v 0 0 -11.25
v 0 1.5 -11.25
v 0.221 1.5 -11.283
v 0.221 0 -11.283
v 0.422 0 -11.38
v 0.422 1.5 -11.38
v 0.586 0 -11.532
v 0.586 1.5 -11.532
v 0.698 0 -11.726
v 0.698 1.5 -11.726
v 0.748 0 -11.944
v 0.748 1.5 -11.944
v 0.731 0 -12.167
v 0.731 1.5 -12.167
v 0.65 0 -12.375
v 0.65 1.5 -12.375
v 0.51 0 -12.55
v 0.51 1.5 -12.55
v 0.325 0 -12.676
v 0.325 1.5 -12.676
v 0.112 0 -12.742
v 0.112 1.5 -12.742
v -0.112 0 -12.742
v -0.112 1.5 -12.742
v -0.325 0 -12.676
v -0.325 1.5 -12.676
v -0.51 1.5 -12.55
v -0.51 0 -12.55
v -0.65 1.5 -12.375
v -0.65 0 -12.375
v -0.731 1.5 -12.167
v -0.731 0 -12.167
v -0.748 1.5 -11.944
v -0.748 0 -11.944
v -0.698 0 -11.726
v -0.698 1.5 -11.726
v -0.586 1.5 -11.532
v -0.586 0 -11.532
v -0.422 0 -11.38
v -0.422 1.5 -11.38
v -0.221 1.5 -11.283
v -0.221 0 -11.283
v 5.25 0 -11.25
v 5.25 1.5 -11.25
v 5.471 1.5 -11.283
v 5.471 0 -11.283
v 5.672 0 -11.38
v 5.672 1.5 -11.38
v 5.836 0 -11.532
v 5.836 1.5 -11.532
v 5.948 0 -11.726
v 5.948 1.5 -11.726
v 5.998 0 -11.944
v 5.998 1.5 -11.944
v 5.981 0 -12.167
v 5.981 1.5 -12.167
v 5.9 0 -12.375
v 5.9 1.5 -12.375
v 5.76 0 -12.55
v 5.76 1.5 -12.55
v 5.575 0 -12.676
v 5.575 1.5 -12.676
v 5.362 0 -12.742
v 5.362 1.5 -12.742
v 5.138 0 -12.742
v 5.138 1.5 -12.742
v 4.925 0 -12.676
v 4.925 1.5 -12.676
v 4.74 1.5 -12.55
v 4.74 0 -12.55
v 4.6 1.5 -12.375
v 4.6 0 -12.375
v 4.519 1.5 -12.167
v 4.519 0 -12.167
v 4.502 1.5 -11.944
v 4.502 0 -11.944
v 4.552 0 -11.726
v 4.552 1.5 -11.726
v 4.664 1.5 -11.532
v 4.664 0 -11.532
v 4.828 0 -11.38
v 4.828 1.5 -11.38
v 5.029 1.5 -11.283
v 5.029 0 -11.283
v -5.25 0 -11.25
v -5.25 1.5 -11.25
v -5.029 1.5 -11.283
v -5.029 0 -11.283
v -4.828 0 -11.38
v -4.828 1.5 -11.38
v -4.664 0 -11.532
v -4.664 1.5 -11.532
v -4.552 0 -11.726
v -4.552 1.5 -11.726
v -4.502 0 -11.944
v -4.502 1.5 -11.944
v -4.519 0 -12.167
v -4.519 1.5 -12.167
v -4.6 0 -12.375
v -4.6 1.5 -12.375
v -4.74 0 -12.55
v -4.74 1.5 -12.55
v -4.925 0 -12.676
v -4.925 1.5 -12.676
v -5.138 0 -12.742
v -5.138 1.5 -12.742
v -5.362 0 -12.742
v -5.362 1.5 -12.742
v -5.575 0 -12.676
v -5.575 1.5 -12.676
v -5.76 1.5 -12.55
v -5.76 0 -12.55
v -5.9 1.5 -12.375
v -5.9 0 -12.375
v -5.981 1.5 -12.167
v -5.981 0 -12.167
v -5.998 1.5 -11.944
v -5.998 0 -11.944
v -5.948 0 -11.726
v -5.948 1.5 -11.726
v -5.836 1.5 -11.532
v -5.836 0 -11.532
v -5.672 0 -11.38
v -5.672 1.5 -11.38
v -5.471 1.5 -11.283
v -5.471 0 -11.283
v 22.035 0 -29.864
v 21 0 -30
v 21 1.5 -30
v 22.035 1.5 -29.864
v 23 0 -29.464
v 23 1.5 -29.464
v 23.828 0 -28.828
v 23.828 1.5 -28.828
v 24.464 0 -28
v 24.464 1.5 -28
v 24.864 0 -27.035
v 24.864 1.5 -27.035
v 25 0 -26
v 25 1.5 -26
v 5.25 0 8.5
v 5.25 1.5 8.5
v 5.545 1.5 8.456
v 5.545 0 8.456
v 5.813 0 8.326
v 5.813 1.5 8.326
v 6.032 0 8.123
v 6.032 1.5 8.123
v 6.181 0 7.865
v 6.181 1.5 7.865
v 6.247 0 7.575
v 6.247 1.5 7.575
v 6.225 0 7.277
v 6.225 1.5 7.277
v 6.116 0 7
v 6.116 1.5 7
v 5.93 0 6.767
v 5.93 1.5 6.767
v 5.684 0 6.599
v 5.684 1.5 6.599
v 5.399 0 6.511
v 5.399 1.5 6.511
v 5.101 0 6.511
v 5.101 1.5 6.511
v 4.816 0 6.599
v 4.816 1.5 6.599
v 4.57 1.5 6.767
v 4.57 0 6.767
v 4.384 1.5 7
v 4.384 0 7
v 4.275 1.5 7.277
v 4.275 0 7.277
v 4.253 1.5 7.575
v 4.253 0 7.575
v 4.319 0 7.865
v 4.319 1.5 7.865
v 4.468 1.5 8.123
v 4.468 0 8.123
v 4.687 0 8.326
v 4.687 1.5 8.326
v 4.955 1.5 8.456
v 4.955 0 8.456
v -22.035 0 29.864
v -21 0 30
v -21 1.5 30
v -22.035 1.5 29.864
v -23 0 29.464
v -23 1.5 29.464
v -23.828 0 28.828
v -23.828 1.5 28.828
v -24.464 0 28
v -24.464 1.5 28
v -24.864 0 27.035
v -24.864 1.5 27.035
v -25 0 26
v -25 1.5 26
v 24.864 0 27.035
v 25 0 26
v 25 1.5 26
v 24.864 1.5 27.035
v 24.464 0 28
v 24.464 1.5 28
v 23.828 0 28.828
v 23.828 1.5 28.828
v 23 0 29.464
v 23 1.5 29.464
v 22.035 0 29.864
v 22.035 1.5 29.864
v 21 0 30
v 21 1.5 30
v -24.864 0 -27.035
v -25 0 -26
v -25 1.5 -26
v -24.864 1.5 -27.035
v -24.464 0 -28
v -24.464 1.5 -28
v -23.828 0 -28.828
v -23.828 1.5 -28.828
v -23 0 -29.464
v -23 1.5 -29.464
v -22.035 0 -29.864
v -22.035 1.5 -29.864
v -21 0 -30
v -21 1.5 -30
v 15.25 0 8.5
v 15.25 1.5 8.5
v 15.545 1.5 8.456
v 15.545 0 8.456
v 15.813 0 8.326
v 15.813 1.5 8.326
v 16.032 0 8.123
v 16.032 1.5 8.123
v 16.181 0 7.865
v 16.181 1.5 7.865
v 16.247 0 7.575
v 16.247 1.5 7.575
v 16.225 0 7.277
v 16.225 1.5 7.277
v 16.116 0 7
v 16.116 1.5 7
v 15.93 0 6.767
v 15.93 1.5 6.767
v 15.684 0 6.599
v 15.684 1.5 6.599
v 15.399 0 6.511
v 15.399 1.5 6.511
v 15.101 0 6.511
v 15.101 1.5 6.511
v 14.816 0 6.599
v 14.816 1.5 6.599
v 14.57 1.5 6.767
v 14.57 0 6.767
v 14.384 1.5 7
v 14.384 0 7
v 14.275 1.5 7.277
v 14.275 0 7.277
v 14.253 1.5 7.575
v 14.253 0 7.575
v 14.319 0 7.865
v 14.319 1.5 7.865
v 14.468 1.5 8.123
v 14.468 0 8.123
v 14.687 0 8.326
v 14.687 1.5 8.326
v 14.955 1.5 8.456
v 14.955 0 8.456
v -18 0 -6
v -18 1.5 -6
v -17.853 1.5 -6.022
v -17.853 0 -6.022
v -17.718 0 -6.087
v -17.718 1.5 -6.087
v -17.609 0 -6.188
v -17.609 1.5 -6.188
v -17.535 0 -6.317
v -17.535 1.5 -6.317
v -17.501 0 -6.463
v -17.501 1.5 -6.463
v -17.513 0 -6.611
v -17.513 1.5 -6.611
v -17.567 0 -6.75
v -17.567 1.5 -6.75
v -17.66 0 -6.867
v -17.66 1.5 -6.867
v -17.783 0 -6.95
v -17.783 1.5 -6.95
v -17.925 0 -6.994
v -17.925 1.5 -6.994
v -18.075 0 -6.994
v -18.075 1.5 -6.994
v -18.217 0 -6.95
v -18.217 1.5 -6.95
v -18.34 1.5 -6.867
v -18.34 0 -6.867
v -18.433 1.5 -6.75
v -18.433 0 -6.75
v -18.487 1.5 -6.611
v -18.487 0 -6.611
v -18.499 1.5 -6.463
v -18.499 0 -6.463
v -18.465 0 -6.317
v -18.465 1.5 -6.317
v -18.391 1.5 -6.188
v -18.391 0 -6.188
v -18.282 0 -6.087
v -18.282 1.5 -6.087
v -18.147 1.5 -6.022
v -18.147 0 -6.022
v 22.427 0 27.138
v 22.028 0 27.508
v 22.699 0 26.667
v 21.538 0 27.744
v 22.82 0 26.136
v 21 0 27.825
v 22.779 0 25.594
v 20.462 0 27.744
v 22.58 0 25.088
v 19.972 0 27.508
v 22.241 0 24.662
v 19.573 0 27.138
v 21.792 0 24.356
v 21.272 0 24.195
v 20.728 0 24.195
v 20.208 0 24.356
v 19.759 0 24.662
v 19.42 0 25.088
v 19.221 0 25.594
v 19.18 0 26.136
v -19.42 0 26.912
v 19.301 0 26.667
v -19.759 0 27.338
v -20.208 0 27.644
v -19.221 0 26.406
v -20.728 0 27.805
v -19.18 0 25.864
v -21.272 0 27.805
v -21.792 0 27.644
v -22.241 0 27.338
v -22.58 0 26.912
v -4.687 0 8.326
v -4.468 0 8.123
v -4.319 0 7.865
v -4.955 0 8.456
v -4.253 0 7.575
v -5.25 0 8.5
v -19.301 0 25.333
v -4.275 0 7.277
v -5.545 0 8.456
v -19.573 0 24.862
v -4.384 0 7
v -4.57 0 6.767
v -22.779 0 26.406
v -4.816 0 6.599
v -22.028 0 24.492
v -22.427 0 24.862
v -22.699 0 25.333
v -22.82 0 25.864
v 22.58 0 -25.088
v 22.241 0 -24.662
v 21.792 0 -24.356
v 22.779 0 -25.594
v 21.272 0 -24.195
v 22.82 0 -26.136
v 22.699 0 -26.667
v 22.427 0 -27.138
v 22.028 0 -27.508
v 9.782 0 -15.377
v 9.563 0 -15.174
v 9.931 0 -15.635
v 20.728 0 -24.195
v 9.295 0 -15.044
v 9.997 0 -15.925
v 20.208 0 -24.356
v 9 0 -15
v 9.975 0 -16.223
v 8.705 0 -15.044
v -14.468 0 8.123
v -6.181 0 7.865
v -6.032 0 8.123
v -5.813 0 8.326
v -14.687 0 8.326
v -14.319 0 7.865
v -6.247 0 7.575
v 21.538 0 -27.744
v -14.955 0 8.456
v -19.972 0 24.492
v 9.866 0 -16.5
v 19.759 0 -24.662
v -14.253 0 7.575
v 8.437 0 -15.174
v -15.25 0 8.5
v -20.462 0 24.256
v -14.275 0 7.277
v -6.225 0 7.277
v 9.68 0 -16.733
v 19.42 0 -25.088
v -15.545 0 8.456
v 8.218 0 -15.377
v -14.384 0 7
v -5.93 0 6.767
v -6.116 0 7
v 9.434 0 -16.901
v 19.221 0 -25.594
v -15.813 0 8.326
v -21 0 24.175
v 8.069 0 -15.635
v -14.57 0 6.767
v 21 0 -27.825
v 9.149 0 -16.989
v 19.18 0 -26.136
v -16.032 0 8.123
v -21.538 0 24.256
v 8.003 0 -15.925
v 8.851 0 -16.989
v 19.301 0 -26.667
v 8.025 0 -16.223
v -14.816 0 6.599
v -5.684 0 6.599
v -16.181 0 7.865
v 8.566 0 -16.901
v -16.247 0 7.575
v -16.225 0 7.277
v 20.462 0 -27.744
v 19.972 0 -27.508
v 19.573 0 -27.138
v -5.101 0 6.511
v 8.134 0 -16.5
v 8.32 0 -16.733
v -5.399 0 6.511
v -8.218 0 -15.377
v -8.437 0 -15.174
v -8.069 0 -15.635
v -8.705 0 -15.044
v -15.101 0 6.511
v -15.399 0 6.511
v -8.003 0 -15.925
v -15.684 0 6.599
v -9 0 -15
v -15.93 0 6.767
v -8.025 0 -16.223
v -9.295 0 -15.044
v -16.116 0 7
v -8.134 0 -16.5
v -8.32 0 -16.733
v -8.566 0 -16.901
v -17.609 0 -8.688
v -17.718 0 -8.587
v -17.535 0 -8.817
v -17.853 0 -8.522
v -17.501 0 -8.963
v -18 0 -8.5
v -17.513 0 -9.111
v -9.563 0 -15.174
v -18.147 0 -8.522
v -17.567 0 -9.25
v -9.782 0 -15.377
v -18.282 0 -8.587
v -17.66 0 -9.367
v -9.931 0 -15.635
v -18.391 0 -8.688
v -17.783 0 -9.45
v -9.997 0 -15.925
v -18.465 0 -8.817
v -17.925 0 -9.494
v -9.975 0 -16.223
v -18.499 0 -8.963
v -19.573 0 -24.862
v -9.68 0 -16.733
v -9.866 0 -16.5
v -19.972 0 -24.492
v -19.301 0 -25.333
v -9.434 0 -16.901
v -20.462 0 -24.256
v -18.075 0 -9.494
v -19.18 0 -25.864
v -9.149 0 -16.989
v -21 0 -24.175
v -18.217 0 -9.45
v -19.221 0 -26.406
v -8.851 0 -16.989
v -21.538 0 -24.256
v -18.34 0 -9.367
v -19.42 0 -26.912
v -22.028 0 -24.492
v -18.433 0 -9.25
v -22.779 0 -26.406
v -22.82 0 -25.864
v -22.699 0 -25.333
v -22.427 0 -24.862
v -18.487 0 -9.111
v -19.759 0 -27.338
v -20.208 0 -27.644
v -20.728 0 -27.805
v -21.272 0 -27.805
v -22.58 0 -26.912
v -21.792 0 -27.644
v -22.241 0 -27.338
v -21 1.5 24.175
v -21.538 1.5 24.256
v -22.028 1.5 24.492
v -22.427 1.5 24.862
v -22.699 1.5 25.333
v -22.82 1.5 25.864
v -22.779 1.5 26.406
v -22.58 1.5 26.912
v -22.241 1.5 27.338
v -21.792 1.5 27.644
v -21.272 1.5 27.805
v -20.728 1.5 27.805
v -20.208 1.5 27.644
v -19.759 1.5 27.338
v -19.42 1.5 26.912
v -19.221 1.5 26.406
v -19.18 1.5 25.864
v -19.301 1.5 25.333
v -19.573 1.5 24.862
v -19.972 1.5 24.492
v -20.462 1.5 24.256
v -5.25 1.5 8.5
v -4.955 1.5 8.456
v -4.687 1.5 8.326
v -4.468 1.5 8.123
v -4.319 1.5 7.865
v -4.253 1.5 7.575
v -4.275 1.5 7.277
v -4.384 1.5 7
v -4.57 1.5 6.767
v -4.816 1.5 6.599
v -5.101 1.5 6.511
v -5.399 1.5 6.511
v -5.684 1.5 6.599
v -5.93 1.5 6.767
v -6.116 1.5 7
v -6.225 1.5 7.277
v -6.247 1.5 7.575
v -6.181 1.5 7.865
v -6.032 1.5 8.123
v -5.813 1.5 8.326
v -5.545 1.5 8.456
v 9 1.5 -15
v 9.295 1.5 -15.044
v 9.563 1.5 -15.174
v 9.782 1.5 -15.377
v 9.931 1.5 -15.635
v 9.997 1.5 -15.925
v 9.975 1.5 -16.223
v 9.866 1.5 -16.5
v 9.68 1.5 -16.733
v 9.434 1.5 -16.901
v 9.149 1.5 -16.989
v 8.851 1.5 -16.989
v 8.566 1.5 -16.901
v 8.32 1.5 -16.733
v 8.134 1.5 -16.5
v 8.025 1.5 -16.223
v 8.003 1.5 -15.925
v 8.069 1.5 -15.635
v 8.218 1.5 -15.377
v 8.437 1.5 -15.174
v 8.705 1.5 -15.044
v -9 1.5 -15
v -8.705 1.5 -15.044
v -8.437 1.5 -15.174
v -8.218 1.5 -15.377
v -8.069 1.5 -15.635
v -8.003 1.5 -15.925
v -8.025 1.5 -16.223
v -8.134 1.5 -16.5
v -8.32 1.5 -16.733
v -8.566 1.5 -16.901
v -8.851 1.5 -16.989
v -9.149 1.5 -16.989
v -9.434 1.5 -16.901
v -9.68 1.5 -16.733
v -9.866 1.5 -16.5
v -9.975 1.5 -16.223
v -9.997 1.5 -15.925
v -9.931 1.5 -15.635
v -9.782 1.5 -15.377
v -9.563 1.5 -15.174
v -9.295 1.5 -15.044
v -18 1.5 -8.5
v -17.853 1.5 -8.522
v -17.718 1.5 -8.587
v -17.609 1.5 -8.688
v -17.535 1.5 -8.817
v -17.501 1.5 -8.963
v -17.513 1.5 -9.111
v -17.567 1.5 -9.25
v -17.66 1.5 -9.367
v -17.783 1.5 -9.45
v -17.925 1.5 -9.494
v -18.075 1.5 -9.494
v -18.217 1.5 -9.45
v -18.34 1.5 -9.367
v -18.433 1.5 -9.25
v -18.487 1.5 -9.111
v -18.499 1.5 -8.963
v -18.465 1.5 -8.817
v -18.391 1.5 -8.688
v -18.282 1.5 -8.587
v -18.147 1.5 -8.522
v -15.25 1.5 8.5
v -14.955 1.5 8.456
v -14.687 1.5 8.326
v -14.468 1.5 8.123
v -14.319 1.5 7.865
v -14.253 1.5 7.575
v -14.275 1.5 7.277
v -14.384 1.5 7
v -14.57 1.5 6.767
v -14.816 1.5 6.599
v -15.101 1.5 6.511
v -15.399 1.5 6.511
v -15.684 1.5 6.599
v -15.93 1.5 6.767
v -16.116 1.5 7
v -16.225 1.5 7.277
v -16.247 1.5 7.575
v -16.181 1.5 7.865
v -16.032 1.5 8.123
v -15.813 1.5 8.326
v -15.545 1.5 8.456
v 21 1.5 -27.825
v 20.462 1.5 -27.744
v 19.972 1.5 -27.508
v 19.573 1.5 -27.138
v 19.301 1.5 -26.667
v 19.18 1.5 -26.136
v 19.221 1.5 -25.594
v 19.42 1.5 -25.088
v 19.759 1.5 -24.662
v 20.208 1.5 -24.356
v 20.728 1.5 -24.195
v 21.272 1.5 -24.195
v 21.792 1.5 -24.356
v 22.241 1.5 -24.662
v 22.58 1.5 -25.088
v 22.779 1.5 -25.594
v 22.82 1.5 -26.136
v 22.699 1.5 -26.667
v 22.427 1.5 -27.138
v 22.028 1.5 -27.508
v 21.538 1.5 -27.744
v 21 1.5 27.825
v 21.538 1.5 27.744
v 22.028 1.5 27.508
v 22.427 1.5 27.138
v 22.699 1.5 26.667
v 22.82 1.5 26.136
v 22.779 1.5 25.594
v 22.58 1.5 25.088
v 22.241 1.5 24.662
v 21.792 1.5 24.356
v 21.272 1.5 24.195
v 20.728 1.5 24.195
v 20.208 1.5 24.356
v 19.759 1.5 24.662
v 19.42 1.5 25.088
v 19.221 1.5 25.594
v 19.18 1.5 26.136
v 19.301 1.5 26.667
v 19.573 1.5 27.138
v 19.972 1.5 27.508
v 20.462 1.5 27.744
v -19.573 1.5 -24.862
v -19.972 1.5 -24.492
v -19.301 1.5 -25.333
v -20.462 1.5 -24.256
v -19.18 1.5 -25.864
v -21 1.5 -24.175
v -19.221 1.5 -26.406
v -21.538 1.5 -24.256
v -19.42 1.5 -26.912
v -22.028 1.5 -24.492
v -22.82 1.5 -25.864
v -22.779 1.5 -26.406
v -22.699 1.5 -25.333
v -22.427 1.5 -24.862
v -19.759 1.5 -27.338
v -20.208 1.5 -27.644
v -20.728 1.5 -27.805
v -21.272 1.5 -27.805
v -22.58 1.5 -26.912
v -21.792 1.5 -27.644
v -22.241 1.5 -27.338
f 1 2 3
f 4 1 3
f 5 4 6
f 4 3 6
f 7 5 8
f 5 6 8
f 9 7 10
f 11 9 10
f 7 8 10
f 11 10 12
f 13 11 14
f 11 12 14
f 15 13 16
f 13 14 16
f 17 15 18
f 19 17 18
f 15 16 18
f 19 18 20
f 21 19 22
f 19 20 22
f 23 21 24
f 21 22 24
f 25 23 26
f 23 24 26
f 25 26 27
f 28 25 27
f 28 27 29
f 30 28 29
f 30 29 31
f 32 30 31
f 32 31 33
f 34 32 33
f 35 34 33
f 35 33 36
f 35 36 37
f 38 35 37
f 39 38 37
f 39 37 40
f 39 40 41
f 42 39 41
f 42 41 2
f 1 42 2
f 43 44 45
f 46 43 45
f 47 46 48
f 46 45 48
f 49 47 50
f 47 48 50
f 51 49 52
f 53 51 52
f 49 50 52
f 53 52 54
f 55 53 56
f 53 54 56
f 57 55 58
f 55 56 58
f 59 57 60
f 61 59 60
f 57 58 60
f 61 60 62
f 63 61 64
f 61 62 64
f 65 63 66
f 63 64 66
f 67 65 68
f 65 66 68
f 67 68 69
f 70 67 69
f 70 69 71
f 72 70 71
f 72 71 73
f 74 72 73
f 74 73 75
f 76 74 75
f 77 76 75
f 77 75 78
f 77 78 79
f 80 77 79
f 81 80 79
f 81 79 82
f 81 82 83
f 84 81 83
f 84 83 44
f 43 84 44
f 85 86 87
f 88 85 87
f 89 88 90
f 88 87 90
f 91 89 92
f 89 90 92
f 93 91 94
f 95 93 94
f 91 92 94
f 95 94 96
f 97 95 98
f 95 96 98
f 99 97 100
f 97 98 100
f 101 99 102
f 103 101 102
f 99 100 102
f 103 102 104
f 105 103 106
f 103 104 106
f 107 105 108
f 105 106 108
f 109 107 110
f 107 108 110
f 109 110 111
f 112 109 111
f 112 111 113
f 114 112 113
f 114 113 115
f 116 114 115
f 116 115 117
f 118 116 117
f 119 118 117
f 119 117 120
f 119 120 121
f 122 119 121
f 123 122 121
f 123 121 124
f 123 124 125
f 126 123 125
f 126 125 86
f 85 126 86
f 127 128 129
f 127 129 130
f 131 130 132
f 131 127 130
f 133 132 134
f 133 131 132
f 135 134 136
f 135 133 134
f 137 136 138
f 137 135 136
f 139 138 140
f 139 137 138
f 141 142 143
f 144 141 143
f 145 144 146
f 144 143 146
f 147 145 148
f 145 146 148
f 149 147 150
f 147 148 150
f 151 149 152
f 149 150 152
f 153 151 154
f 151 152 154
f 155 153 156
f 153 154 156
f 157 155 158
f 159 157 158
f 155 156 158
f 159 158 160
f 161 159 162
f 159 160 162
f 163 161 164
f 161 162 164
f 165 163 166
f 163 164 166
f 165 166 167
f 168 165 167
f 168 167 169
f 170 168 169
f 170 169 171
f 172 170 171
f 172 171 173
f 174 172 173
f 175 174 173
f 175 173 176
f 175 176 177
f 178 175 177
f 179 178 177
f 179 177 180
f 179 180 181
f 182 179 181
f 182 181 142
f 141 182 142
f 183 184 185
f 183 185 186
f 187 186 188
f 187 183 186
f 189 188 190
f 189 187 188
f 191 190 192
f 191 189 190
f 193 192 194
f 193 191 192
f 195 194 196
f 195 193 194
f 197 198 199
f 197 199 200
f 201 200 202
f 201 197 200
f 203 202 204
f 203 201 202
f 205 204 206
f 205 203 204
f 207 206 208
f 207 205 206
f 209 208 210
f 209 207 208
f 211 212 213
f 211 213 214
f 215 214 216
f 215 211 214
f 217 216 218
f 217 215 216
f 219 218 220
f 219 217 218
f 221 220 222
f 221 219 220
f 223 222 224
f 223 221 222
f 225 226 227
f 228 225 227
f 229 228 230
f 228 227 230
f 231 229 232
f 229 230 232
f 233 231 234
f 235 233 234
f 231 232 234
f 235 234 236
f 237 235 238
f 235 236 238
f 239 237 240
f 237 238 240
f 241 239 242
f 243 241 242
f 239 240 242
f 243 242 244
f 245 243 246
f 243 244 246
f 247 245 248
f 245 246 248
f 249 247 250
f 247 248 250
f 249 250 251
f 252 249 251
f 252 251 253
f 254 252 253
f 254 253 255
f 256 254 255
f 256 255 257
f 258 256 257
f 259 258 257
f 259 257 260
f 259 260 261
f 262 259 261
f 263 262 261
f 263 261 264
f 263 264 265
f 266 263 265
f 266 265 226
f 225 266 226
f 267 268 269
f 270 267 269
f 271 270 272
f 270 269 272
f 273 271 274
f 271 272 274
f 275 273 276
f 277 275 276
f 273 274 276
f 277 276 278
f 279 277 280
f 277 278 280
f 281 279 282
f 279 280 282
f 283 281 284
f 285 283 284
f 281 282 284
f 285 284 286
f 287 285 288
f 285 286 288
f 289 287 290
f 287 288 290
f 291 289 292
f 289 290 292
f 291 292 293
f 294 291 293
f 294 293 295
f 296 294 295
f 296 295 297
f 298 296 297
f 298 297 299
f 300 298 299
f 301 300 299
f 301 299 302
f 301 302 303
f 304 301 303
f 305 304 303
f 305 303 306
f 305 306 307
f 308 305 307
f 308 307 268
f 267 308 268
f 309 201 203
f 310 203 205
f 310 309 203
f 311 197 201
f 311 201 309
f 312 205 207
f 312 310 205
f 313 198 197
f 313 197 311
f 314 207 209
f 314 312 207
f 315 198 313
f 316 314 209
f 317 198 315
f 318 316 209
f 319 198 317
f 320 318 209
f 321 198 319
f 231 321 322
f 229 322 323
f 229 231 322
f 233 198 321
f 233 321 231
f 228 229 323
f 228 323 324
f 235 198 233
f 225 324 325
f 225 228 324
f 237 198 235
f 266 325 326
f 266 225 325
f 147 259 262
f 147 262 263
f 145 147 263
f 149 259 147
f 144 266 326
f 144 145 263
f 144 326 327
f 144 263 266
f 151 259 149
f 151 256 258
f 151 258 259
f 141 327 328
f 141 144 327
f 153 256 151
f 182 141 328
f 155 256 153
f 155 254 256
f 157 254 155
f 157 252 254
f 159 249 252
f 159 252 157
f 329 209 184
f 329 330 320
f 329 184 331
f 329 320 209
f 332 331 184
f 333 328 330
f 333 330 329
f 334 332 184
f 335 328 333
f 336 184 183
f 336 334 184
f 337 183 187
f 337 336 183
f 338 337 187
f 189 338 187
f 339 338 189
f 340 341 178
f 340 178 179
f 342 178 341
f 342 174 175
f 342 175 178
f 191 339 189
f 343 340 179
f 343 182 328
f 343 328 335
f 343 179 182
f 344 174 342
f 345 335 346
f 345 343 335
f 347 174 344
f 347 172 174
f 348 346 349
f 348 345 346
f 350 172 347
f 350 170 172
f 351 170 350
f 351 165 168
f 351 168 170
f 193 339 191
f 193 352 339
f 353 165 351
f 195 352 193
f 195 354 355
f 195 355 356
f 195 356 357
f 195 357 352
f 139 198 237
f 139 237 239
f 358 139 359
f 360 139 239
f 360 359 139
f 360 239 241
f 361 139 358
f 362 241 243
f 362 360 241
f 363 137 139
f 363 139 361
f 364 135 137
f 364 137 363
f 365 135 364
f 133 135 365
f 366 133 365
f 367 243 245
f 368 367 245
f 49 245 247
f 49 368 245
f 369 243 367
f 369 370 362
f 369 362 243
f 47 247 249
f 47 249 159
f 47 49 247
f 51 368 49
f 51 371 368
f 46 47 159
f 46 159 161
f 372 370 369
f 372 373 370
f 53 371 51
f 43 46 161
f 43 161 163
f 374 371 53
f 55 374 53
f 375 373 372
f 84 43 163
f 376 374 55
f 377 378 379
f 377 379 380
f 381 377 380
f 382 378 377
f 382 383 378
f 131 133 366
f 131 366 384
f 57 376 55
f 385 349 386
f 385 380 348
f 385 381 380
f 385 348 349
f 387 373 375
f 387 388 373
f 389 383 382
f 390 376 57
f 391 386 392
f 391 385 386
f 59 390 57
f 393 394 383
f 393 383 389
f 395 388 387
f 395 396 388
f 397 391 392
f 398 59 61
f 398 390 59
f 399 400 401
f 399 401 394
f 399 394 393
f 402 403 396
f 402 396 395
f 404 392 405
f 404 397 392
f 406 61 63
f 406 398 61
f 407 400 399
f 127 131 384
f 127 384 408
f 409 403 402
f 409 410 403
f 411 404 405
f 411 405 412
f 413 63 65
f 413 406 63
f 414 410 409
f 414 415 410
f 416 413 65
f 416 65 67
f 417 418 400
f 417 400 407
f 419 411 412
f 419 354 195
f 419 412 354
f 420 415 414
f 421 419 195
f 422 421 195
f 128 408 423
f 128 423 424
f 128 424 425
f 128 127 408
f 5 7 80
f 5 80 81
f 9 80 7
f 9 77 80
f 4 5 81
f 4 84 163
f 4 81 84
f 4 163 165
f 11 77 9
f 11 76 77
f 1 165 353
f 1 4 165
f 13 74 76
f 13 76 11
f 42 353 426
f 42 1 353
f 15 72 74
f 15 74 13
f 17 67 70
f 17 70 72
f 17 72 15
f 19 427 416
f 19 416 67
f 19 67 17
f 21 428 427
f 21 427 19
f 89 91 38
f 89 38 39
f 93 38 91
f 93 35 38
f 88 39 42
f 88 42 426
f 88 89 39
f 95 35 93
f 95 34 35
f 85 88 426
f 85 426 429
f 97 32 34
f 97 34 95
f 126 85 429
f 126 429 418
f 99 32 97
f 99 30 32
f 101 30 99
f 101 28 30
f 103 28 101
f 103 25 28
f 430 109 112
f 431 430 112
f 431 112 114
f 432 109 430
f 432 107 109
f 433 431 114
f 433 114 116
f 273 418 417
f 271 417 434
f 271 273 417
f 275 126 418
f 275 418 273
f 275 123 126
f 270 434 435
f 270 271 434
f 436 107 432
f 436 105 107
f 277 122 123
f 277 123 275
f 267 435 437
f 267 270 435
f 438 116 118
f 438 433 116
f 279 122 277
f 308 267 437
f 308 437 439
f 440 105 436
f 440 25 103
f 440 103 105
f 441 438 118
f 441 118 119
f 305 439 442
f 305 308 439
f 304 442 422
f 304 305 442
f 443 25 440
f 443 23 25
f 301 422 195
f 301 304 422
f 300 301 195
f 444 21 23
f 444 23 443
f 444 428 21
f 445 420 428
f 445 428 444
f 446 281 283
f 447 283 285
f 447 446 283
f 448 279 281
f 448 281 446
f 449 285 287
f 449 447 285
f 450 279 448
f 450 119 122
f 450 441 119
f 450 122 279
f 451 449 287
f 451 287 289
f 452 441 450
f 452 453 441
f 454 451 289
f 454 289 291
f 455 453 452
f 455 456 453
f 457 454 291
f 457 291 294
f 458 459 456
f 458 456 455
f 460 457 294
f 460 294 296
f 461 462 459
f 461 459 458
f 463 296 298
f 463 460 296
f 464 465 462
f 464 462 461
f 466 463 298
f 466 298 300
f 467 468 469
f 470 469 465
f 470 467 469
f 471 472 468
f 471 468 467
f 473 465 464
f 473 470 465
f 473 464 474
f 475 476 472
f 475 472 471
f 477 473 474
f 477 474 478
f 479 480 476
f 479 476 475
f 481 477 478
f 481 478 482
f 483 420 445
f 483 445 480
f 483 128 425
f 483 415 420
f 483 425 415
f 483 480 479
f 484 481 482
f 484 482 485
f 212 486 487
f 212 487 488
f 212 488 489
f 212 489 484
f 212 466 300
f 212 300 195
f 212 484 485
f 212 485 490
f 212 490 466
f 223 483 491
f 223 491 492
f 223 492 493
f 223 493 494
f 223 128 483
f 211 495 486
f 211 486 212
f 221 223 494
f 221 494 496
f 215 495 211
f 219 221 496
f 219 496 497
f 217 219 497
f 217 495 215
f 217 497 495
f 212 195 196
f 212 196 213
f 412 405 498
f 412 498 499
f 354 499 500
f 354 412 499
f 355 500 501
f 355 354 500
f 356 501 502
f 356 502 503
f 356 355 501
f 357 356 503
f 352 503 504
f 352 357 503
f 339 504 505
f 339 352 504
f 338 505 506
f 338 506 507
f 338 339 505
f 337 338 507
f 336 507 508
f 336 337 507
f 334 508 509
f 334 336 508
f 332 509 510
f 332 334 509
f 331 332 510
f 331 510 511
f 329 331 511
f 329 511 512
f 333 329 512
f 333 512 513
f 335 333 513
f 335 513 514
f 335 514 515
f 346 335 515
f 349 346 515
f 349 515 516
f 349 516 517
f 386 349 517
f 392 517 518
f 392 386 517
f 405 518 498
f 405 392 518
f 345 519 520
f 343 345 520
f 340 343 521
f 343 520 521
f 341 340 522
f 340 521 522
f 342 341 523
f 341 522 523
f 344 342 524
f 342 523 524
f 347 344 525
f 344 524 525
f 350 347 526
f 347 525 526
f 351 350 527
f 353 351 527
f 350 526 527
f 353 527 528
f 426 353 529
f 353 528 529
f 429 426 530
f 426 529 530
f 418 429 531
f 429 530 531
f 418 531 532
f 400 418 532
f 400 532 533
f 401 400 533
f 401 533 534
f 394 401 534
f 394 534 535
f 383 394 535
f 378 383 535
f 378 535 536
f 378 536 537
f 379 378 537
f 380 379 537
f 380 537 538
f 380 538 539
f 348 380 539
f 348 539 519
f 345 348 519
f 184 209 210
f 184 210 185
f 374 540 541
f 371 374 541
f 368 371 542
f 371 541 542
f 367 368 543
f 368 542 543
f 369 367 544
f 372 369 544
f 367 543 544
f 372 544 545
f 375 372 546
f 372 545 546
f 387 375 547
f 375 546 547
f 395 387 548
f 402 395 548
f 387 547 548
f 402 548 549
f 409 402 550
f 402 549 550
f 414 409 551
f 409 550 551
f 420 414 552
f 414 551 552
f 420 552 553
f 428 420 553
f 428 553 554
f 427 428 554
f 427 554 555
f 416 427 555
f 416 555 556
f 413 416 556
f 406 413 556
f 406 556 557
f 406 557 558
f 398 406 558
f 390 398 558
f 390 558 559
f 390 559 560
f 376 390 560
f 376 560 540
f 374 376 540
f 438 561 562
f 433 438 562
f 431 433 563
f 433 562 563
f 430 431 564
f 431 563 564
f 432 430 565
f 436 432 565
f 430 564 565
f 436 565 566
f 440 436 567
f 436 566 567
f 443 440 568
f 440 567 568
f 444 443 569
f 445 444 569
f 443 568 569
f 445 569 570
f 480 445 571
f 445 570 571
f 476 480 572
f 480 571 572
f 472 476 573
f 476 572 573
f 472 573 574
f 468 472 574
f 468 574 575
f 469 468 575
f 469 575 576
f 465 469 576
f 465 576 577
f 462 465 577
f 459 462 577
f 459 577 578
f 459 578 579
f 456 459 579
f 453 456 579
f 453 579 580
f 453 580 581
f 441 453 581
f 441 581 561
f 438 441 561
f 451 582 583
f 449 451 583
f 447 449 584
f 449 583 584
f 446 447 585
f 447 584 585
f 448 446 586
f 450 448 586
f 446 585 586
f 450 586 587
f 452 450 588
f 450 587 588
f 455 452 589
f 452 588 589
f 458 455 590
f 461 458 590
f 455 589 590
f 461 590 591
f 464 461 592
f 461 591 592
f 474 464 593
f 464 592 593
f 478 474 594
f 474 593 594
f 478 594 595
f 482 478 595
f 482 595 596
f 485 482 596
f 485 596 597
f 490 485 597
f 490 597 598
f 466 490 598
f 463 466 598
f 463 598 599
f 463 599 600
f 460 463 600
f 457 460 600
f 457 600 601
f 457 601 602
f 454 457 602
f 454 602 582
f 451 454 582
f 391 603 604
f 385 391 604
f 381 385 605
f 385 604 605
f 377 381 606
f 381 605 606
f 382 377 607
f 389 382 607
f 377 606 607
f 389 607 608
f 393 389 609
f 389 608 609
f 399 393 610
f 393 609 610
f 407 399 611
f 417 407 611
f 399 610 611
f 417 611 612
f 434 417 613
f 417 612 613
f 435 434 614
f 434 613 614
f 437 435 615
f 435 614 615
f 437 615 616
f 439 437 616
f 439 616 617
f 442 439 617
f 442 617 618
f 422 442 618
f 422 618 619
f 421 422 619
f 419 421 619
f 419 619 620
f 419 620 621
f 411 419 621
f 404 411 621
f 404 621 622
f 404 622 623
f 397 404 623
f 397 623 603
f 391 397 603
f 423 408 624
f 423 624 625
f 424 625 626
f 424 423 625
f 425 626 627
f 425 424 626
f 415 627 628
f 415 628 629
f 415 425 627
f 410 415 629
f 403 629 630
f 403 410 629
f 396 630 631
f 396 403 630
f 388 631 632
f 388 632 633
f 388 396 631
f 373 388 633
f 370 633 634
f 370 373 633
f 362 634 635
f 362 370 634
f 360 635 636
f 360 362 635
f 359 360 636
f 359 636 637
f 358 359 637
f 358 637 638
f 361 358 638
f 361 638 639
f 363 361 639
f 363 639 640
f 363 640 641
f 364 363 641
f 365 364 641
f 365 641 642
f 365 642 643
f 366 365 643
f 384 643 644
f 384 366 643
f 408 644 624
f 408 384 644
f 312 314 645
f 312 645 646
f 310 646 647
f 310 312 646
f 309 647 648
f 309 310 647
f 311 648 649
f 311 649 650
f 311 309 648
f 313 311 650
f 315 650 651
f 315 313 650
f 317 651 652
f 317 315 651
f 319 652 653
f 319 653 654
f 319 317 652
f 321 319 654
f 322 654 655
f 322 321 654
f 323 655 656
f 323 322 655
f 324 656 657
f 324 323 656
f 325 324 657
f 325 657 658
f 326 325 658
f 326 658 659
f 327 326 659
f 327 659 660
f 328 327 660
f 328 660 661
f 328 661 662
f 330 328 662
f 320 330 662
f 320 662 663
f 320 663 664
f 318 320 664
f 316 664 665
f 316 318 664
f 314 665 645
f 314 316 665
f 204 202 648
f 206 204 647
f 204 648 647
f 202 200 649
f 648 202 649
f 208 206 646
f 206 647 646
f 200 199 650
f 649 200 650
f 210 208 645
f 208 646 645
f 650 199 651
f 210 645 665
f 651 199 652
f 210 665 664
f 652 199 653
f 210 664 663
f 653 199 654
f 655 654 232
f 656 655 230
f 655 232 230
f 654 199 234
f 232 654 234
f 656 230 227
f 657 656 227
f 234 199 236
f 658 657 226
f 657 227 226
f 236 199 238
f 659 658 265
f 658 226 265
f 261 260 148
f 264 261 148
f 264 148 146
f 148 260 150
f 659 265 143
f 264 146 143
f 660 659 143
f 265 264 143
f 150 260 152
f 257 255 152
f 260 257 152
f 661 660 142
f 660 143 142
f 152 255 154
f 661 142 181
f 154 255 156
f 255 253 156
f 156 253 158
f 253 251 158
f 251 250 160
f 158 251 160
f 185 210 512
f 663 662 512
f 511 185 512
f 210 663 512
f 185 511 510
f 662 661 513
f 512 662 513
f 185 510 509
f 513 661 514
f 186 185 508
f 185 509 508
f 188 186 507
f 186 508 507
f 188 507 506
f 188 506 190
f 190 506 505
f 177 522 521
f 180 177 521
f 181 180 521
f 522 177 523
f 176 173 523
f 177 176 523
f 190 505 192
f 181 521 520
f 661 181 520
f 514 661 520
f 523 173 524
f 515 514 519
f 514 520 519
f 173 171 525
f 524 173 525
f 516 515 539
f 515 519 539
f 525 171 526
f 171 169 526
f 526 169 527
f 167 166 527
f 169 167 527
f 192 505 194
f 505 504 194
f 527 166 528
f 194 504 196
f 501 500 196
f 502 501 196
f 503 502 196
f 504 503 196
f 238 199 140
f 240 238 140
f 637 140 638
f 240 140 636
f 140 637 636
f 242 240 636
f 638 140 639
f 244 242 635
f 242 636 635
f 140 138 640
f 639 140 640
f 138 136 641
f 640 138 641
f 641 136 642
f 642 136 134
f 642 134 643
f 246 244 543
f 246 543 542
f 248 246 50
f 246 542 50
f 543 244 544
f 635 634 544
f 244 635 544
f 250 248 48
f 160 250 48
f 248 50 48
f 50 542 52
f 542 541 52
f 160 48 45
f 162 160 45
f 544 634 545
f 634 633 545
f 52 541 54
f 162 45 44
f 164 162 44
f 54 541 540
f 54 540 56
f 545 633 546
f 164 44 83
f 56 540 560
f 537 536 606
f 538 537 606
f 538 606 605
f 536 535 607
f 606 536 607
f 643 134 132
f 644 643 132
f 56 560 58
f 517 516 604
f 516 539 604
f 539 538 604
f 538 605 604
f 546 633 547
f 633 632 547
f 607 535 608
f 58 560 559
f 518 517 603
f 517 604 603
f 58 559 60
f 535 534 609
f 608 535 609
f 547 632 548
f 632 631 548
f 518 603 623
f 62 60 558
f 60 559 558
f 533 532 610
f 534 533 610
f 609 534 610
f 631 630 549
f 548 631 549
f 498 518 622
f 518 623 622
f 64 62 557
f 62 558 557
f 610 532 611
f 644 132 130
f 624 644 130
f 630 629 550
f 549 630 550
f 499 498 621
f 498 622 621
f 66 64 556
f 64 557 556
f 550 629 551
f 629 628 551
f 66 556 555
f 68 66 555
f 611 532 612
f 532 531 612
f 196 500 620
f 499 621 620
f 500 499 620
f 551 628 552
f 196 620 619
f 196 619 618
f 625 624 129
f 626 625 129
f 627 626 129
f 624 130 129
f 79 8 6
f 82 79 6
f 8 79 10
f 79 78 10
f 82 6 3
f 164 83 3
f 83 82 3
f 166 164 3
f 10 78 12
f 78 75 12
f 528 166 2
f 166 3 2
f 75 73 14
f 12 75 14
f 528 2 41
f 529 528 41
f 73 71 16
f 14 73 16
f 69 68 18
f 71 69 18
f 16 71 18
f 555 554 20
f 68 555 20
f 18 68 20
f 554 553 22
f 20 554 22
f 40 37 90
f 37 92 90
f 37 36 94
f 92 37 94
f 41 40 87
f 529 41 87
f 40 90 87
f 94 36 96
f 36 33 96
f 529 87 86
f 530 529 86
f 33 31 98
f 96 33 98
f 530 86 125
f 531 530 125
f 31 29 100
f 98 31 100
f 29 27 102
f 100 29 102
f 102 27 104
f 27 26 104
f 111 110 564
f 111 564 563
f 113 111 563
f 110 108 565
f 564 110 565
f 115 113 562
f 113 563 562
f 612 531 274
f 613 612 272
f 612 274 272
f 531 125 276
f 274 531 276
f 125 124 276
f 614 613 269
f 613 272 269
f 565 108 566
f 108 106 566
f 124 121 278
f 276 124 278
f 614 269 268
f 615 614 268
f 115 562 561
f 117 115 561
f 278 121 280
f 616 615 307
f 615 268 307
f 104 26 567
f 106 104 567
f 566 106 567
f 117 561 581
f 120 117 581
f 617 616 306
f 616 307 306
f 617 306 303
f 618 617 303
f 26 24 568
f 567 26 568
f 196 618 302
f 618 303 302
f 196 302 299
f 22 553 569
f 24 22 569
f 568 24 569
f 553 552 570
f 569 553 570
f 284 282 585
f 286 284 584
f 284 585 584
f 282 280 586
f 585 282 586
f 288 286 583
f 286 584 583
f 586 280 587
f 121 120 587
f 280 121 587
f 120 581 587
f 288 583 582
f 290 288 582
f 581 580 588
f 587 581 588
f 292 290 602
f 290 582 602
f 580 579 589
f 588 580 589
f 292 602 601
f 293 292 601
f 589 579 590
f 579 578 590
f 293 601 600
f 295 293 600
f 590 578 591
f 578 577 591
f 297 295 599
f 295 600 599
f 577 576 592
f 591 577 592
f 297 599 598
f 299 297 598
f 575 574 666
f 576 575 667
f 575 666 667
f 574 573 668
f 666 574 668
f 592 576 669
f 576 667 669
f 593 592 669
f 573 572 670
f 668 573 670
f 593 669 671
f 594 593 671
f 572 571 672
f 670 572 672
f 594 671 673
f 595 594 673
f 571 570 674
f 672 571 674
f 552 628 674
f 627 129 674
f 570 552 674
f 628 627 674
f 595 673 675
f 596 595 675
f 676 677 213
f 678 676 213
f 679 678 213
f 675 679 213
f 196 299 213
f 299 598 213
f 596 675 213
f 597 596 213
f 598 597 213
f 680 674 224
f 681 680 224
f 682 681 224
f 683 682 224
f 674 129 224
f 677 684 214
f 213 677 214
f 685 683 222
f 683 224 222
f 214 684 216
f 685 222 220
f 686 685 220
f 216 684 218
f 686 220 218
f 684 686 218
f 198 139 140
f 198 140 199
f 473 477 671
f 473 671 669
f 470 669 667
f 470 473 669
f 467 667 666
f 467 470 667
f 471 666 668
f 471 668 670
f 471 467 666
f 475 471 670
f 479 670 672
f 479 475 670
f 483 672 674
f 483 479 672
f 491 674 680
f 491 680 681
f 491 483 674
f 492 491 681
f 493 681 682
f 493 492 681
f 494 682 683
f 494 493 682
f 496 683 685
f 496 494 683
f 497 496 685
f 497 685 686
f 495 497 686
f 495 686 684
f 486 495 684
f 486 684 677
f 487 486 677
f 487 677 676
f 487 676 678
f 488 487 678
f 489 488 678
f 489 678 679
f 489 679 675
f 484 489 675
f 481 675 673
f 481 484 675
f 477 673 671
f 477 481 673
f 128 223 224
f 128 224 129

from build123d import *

# Parameters (mm, degrees)
SKETCH1_R           = 1.825
BOSS_EXTRUDE1_DEPTH = 1.5
CUT_EXTRUDE1_REACH  = 41.08
SKETCH2_R           = 1
SKETCH2_R_2         = 0.75
SKETCH2_R_3         = 0.5


with BuildPart() as part:
    # Sketch1 → Boss-Extrude1 (new body)
    with BuildSketch(Plane(origin=(0, 0, 0), x_dir=(1, 0, 0), z_dir=(0, 1, 0))):
        with BuildLine():
            Line((-21, 30), (21, 30))
            ThreePointArc((21, 30), (23.828427125, 28.828427125), (25, 26))
            Line((25, 26), (25, -26))
            ThreePointArc((25, -26), (23.828427125, -28.828427125), (21, -30))
            Line((21, -30), (-21, -30))
            ThreePointArc((-21, -30), (-23.828427125, -28.828427125), (-25, -26))
            Line((-25, -26), (-25, 26))
            ThreePointArc((-25, 26), (-23.828427125, 28.828427125), (-21, 30))
        make_face()
        with Locations(Location((-21, 26, 0), (0, 0, 270))):
            Circle(SKETCH1_R, mode=Mode.SUBTRACT)
        with Locations(Location((21, 26, 0), (0, 0, 90))):
            Circle(SKETCH1_R, mode=Mode.SUBTRACT)
        with Locations(Location((21, -26, 0), (0, 0, 270))):
            Circle(SKETCH1_R, mode=Mode.SUBTRACT)
        with Locations(Location((-21, -26, 0), (0, 0, 90))):
            Circle(SKETCH1_R, mode=Mode.SUBTRACT)
    extrude(amount=BOSS_EXTRUDE1_DEPTH)

    # Sketch2 → Cut-Extrude1 (cut, up to next)
    with BuildSketch(Plane(origin=(0, 1.5, 0), x_dir=(1, 0, 0), z_dir=(0, 1, 0)), mode=Mode.PRIVATE) as cut_extrude1_sk1:
        with Locations(Location((-9, 16, 0), (0, 0, 270))):
            Circle(SKETCH2_R)
    cut_extrude1_tool1 = extrude(cut_extrude1_sk1.sketch, amount=-CUT_EXTRUDE1_REACH, mode=Mode.PRIVATE) & part.part
    # Sketch2 → Cut-Extrude1 (cut, up to next)
    with BuildSketch(Plane(origin=(0, 1.5, 0), x_dir=(1, 0, 0), z_dir=(0, 1, 0)), mode=Mode.PRIVATE) as cut_extrude1_sk2:
        with Locations(Location((9, 16, 0), (0, 0, 270))):
            Circle(SKETCH2_R)
    cut_extrude1_tool2 = extrude(cut_extrude1_sk2.sketch, amount=-CUT_EXTRUDE1_REACH, mode=Mode.PRIVATE) & part.part
    # Sketch2 → Cut-Extrude1 (cut, up to next)
    with BuildSketch(Plane(origin=(0, 1.5, 0), x_dir=(1, 0, 0), z_dir=(0, 1, 0)), mode=Mode.PRIVATE) as cut_extrude1_sk3:
        with Locations(Location((-5.25, 12, 0), (0, 0, 270))):
            Circle(SKETCH2_R_2)
    cut_extrude1_tool3 = extrude(cut_extrude1_sk3.sketch, amount=-CUT_EXTRUDE1_REACH, mode=Mode.PRIVATE) & part.part
    # Sketch2 → Cut-Extrude1 (cut, up to next)
    with BuildSketch(Plane(origin=(0, 1.5, 0), x_dir=(1, 0, 0), z_dir=(0, 1, 0)), mode=Mode.PRIVATE) as cut_extrude1_sk4:
        with Locations(Location((0, 12, 0), (0, 0, 270))):
            Circle(SKETCH2_R_2)
    cut_extrude1_tool4 = extrude(cut_extrude1_sk4.sketch, amount=-CUT_EXTRUDE1_REACH, mode=Mode.PRIVATE) & part.part
    # Sketch2 → Cut-Extrude1 (cut, up to next)
    with BuildSketch(Plane(origin=(0, 1.5, 0), x_dir=(1, 0, 0), z_dir=(0, 1, 0)), mode=Mode.PRIVATE) as cut_extrude1_sk5:
        with Locations(Location((5.25, 12, 0), (0, 0, 270))):
            Circle(SKETCH2_R_2)
    cut_extrude1_tool5 = extrude(cut_extrude1_sk5.sketch, amount=-CUT_EXTRUDE1_REACH, mode=Mode.PRIVATE) & part.part
    # Sketch2 → Cut-Extrude1 (cut, up to next)
    with BuildSketch(Plane(origin=(0, 1.5, 0), x_dir=(1, 0, 0), z_dir=(0, 1, 0)), mode=Mode.PRIVATE) as cut_extrude1_sk6:
        with Locations(Location((-15.25, -7.5, 0), (0, 0, 270))):
            Circle(SKETCH2_R)
    cut_extrude1_tool6 = extrude(cut_extrude1_sk6.sketch, amount=-CUT_EXTRUDE1_REACH, mode=Mode.PRIVATE) & part.part
    # Sketch2 → Cut-Extrude1 (cut, up to next)
    with BuildSketch(Plane(origin=(0, 1.5, 0), x_dir=(1, 0, 0), z_dir=(0, 1, 0)), mode=Mode.PRIVATE) as cut_extrude1_sk7:
        with Locations(Location((-5.25, -7.5, 0), (0, 0, 270))):
            Circle(SKETCH2_R)
    cut_extrude1_tool7 = extrude(cut_extrude1_sk7.sketch, amount=-CUT_EXTRUDE1_REACH, mode=Mode.PRIVATE) & part.part
    # Sketch2 → Cut-Extrude1 (cut, up to next)
    with BuildSketch(Plane(origin=(0, 1.5, 0), x_dir=(1, 0, 0), z_dir=(0, 1, 0)), mode=Mode.PRIVATE) as cut_extrude1_sk8:
        with Locations(Location((5.25, -7.5, 0), (0, 0, 270))):
            Circle(SKETCH2_R)
    cut_extrude1_tool8 = extrude(cut_extrude1_sk8.sketch, amount=-CUT_EXTRUDE1_REACH, mode=Mode.PRIVATE) & part.part
    # Sketch2 → Cut-Extrude1 (cut, up to next)
    with BuildSketch(Plane(origin=(0, 1.5, 0), x_dir=(1, 0, 0), z_dir=(0, 1, 0)), mode=Mode.PRIVATE) as cut_extrude1_sk9:
        with Locations(Location((15.25, -7.5, 0), (0, 0, 270))):
            Circle(SKETCH2_R)
    cut_extrude1_tool9 = extrude(cut_extrude1_sk9.sketch, amount=-CUT_EXTRUDE1_REACH, mode=Mode.PRIVATE) & part.part
    # Sketch2 → Cut-Extrude1 (cut, up to next)
    with BuildSketch(Plane(origin=(0, 1.5, 0), x_dir=(1, 0, 0), z_dir=(0, 1, 0)), mode=Mode.PRIVATE) as cut_extrude1_sk10:
        with Locations(Location((-18, 9, 0), (0, 0, 270))):
            Circle(SKETCH2_R_3)
    cut_extrude1_tool10 = extrude(cut_extrude1_sk10.sketch, amount=-CUT_EXTRUDE1_REACH, mode=Mode.PRIVATE) & part.part
    # Sketch2 → Cut-Extrude1 (cut, up to next)
    with BuildSketch(Plane(origin=(0, 1.5, 0), x_dir=(1, 0, 0), z_dir=(0, 1, 0)), mode=Mode.PRIVATE) as cut_extrude1_sk11:
        with Locations(Location((-18, 6.5, 0), (0, 0, 270))):
            Circle(SKETCH2_R_3)
    cut_extrude1_tool11 = extrude(cut_extrude1_sk11.sketch, amount=-CUT_EXTRUDE1_REACH, mode=Mode.PRIVATE) & part.part
    add(cut_extrude1_tool1.solids().sort_by_distance((-9, 1.5, -16))[0], mode=Mode.SUBTRACT)
    add(cut_extrude1_tool2.solids().sort_by_distance((9, 1.5, -16))[0], mode=Mode.SUBTRACT)
    add(cut_extrude1_tool3.solids().sort_by_distance((-5.25, 1.5, -12))[0], mode=Mode.SUBTRACT)
    add(cut_extrude1_tool4.solids().sort_by_distance((0, 1.5, -12))[0], mode=Mode.SUBTRACT)
    add(cut_extrude1_tool5.solids().sort_by_distance((5.25, 1.5, -12))[0], mode=Mode.SUBTRACT)
    add(cut_extrude1_tool6.solids().sort_by_distance((-15.25, 1.5, 7.5))[0], mode=Mode.SUBTRACT)
    add(cut_extrude1_tool7.solids().sort_by_distance((-5.25, 1.5, 7.5))[0], mode=Mode.SUBTRACT)
    add(cut_extrude1_tool8.solids().sort_by_distance((5.25, 1.5, 7.5))[0], mode=Mode.SUBTRACT)
    add(cut_extrude1_tool9.solids().sort_by_distance((15.25, 1.5, 7.5))[0], mode=Mode.SUBTRACT)
    add(cut_extrude1_tool10.solids().sort_by_distance((-18, 1.5, -9))[0], mode=Mode.SUBTRACT)
    add(cut_extrude1_tool11.solids().sort_by_distance((-18, 1.5, -6.5))[0], mode=Mode.SUBTRACT)


solid = part.part
